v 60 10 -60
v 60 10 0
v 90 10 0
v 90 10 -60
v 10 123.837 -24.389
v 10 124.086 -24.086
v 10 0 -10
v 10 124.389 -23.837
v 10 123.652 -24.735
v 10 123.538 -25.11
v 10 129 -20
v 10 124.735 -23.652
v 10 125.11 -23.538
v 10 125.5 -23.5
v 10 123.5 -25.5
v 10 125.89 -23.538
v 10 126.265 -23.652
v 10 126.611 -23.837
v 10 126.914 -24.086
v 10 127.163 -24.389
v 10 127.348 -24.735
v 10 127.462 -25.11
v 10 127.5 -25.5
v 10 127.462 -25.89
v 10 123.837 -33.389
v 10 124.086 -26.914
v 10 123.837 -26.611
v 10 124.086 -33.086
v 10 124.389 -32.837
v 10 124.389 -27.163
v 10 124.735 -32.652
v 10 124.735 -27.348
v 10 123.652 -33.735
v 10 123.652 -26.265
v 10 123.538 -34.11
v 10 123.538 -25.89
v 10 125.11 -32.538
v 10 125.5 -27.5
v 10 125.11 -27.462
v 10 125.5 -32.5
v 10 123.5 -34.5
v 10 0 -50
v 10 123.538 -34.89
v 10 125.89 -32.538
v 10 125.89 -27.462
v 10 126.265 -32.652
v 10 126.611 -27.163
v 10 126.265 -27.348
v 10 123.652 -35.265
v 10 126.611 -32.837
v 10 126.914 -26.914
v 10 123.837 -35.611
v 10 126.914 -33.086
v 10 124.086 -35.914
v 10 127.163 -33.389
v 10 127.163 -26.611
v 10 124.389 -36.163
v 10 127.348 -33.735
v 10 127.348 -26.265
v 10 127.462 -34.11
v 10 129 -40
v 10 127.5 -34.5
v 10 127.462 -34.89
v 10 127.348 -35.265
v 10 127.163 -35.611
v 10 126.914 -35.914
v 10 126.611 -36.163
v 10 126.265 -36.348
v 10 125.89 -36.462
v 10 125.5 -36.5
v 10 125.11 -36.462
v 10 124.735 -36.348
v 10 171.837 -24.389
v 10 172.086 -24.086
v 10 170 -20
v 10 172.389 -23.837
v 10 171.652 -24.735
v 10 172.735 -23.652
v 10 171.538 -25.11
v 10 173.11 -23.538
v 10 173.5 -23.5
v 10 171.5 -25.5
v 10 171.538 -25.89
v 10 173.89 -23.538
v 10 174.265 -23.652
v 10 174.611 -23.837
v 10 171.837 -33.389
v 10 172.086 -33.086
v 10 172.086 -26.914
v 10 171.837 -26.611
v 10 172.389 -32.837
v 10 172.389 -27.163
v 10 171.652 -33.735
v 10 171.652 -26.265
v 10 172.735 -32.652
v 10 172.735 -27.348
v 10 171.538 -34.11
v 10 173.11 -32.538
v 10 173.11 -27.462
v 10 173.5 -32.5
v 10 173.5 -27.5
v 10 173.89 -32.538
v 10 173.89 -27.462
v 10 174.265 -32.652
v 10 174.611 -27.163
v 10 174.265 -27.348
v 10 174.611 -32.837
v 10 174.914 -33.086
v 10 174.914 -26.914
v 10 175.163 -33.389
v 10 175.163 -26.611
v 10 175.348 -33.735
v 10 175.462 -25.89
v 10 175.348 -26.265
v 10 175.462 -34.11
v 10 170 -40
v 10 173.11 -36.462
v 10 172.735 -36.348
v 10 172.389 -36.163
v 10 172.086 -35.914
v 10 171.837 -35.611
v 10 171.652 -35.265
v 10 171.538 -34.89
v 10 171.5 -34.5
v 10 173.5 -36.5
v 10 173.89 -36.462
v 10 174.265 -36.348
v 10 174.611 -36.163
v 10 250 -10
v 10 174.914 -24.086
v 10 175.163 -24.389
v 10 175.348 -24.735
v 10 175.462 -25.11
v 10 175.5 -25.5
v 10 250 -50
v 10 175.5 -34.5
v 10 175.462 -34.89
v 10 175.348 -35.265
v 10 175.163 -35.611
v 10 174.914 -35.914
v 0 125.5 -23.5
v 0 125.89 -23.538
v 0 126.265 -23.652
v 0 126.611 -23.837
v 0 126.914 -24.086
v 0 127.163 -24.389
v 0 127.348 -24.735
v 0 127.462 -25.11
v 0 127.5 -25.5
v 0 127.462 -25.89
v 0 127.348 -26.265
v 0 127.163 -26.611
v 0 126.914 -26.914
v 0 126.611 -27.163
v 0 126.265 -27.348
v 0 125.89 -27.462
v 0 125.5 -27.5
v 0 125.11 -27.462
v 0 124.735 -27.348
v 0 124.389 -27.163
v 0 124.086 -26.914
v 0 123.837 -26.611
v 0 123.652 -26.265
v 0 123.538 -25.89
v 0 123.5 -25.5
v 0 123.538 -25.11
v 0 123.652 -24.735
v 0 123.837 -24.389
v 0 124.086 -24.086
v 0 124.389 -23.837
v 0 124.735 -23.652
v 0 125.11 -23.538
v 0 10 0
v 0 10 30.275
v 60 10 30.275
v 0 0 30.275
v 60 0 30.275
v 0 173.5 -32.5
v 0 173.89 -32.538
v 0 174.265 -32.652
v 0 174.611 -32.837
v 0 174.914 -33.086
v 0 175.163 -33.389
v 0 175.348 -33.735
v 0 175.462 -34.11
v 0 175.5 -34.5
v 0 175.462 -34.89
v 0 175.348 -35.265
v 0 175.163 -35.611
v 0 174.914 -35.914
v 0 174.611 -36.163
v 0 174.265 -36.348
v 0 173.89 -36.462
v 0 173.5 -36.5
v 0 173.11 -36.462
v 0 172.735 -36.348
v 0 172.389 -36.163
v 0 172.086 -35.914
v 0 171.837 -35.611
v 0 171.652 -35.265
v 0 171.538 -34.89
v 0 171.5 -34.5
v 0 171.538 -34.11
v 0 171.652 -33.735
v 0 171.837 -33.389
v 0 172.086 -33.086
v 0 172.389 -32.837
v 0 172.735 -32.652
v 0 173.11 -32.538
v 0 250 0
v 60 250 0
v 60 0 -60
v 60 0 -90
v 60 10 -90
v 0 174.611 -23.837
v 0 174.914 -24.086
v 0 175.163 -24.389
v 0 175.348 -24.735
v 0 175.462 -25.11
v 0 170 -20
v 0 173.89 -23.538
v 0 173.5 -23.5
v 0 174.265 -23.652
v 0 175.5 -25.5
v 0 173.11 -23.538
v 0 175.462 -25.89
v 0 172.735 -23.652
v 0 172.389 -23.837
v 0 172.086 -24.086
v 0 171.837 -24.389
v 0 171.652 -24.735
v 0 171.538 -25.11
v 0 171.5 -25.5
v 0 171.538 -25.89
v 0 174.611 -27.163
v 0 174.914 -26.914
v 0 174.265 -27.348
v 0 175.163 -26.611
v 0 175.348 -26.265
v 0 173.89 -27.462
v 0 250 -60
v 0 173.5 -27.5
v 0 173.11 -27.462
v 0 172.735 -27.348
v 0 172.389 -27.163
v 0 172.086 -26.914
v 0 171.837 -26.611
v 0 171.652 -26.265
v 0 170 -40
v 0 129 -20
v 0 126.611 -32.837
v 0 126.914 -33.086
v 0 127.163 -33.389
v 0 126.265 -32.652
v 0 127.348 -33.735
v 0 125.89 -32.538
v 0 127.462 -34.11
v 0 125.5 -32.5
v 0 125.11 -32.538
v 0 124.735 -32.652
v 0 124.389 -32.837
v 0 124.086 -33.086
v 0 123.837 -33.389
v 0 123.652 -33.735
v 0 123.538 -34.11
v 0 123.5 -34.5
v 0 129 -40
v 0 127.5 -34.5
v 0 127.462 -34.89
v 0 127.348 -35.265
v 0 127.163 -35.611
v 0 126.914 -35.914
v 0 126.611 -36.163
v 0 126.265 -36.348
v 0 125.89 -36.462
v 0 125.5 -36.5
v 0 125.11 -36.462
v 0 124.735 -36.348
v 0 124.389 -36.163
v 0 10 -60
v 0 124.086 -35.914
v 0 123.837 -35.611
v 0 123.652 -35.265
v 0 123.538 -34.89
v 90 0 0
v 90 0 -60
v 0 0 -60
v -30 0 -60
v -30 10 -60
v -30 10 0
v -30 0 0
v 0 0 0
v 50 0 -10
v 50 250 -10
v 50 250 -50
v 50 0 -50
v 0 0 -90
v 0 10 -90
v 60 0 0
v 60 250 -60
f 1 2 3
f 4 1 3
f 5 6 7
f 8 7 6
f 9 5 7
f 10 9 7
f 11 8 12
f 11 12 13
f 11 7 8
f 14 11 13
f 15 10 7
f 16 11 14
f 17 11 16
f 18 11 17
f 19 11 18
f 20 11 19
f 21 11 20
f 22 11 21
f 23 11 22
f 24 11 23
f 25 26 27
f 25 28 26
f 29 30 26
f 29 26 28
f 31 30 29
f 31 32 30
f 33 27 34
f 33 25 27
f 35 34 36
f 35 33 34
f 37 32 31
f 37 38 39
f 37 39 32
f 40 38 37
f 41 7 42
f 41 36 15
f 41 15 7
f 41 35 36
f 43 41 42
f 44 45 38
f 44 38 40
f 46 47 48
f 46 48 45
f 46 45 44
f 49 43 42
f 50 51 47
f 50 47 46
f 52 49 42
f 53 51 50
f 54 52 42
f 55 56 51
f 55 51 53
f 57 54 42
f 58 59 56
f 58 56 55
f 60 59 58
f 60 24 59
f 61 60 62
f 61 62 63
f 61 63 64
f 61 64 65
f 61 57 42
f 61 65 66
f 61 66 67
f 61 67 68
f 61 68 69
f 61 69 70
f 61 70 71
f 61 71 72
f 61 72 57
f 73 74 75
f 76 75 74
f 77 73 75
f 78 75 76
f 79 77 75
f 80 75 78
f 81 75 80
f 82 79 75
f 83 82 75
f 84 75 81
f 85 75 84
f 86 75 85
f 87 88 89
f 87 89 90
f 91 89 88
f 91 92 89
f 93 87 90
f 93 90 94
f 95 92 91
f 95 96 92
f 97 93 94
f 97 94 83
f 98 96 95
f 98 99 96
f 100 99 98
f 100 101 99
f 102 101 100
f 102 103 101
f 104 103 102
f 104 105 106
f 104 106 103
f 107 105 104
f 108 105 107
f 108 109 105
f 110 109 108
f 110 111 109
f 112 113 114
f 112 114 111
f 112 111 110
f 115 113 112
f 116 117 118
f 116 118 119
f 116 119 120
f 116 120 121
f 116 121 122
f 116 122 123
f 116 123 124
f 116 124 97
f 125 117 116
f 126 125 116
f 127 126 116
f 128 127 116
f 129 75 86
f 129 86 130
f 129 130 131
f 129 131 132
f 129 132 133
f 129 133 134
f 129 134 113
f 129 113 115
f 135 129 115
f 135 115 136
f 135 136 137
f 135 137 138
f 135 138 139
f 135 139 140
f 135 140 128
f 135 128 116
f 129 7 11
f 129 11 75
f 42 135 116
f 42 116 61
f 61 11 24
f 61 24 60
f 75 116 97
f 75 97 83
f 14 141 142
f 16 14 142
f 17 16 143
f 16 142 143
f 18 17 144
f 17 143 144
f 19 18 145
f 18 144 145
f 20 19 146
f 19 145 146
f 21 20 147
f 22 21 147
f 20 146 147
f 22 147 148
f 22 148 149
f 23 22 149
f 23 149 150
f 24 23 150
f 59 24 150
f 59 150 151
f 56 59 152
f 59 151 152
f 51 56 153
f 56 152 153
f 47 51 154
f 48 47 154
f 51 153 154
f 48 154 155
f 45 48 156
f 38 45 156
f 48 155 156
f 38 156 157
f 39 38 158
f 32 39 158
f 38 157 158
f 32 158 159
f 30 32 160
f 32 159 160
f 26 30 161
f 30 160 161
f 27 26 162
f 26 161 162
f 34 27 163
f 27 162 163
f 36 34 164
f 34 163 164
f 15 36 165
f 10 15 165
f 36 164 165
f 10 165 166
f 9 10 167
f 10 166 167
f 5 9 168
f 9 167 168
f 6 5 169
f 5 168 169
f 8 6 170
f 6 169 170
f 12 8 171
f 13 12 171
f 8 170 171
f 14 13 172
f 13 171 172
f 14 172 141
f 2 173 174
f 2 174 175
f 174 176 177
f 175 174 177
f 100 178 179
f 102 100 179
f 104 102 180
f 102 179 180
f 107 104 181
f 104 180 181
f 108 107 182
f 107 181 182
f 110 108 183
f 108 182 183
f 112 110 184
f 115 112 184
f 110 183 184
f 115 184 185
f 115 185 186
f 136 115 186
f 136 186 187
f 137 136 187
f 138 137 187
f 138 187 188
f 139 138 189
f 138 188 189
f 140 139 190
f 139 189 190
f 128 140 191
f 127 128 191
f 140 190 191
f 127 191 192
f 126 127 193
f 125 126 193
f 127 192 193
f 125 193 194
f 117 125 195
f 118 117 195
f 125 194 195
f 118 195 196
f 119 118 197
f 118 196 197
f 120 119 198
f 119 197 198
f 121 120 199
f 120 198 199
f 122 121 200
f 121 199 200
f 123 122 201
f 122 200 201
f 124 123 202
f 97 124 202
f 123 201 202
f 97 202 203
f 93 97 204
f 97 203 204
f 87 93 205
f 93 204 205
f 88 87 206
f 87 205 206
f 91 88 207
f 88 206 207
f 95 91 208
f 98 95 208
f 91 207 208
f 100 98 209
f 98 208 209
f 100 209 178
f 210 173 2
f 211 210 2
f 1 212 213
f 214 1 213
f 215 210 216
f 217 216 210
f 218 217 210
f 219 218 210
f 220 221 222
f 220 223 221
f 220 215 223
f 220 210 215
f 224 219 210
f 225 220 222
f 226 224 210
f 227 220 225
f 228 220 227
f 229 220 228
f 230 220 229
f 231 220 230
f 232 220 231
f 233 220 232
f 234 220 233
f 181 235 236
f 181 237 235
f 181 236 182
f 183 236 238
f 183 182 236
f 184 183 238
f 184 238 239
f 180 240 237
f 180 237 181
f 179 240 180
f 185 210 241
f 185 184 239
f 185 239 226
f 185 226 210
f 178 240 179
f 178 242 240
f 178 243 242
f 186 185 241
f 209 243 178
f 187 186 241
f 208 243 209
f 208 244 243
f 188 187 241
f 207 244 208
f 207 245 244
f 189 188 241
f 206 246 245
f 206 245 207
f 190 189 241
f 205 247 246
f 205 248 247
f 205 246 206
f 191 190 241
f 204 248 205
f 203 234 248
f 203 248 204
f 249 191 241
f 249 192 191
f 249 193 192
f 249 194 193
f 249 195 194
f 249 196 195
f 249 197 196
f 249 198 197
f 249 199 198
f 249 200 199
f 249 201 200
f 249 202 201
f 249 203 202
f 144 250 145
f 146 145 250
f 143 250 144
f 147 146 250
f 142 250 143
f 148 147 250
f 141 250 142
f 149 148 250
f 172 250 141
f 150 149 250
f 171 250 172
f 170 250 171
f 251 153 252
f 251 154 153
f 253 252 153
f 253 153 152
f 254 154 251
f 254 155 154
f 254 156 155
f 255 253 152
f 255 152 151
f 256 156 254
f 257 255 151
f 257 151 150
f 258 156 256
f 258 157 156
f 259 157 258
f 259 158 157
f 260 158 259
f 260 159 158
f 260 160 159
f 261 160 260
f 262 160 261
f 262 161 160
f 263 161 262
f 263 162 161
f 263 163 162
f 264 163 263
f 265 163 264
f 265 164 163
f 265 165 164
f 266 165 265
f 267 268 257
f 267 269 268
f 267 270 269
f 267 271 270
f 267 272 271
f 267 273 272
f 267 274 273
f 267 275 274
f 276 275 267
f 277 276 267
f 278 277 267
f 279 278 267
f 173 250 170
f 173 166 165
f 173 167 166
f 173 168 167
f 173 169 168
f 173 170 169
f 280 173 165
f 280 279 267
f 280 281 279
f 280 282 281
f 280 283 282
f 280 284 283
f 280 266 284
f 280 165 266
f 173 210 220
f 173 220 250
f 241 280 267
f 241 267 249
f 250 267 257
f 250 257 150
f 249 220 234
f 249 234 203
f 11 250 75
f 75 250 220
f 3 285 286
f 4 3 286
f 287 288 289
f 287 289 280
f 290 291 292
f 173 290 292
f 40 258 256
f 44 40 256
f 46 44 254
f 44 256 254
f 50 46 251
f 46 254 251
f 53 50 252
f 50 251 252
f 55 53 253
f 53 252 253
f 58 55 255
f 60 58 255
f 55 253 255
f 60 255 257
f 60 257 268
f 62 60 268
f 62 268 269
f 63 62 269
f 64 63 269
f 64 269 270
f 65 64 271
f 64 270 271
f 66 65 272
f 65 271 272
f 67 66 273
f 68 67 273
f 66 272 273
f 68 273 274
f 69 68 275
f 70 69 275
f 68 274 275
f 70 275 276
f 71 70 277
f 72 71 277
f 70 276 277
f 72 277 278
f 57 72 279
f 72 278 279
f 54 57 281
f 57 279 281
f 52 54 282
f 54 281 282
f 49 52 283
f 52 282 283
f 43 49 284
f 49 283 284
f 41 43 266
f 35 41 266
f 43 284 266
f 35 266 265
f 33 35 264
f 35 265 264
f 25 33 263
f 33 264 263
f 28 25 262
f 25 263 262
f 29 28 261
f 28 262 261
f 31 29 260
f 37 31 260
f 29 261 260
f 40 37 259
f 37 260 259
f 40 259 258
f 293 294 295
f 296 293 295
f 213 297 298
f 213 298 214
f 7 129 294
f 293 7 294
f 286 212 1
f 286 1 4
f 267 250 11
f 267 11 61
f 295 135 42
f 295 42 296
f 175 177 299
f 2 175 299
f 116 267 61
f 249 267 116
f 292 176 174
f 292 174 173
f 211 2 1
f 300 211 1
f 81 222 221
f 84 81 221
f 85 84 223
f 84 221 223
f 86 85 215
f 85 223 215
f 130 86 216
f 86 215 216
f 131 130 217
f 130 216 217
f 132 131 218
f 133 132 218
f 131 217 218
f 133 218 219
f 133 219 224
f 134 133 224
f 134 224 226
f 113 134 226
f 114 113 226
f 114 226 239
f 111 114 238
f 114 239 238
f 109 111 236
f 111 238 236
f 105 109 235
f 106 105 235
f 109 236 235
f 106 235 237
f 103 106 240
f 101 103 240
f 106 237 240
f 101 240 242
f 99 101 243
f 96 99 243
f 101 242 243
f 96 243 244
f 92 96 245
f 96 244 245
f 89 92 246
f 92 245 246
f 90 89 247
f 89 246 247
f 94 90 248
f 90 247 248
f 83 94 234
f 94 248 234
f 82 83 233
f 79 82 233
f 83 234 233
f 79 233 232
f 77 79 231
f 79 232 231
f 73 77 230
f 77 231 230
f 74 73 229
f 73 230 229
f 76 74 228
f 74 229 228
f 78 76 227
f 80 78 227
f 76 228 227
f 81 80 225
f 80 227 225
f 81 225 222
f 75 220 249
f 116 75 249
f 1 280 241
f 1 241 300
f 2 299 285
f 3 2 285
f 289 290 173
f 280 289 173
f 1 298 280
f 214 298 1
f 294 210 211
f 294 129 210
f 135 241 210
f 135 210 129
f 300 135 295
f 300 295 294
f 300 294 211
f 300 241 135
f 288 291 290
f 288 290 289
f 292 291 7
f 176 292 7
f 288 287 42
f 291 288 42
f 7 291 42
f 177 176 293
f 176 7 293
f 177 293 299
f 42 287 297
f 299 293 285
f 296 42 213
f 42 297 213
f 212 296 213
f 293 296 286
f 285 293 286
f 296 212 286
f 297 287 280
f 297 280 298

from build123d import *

# Parameters (mm, degrees)
ESQUISSE1_W             = 60
ESQUISSE1_H             = 60
BOSS_EXTRU_1_DEPTH      = 250
ESQUISSE2_W             = 40
ESQUISSE2_H             = 40
ENL_V_MAT_EXTRU_1_DEPTH = 250
ESQUISSE3_W             = 20
ESQUISSE3_H             = 41
ENL_V_MAT_EXTRU_7_DEPTH = 10
ESQUISSE4_W             = 60
ESQUISSE4_H             = 30
ESQUISSE4_W_2           = 30
ESQUISSE4_H_2           = 60
ESQUISSE4_H_3           = 30.275028017
BOSS_EXTRU_2_DEPTH      = 10
ESQUISSE6_R             = 2
ENL_V_MAT_EXTRU_8_DEPTH = 10


with BuildPart() as part:
    # Esquisse1 → Boss.-Extru.1 (new body)
    with BuildSketch(Plane(origin=(0, 0, 0), x_dir=(1, 0, 0), z_dir=(0, 1, 0))):
        with Locations((30, 30)):
            Rectangle(ESQUISSE1_W, ESQUISSE1_H)
    extrude(amount=BOSS_EXTRU_1_DEPTH)

    # Esquisse2 → Enlèv. mat.-Extru.1 (cut)
    with BuildSketch(Plane(origin=(0, 250, 0), x_dir=(1, 0, 0), z_dir=(0, 1, 0))):
        with Locations((30, 30)):
            Rectangle(ESQUISSE2_W, ESQUISSE2_H)
    extrude(amount=-ENL_V_MAT_EXTRU_1_DEPTH, mode=Mode.SUBTRACT)

    # Esquisse3 → Enlèv. mat.-Extru.7 (cut)
    with BuildSketch(Plane(origin=(0, 0, 0), x_dir=(0, 0, -1), z_dir=(1, 0, 0))):
        with Locations((30, 149.5)):
            Rectangle(ESQUISSE3_W, ESQUISSE3_H)
    extrude(amount=ENL_V_MAT_EXTRU_7_DEPTH, mode=Mode.SUBTRACT)

    # Esquisse4 → Boss.-Extru.2 (add)
    with BuildSketch(Plane(origin=(0, 0, 0), x_dir=(1, 0, 0), z_dir=(0, 1, 0))):
        with Locations((30, 75)):
            Rectangle(ESQUISSE4_W, ESQUISSE4_H)
        with Locations((-15, 30)):
            Rectangle(ESQUISSE4_W_2, ESQUISSE4_H_2)
        with Locations((75, 30)):
            Rectangle(ESQUISSE4_W_2, ESQUISSE4_H_2)
        with Locations((30, -15.137514009)):
            Rectangle(ESQUISSE4_W, ESQUISSE4_H_3)
    extrude(amount=BOSS_EXTRU_2_DEPTH)

    # Esquisse6 → Enlèv. mat.-Extru.8 (cut)
    with BuildSketch(Plane.ZY):
        with Locations((-34.5, 173.5)):
            Circle(ESQUISSE6_R)
        with Locations((-25.5, 173.5)):
            Circle(ESQUISSE6_R)
        with Locations((-34.5, 125.5)):
            Circle(ESQUISSE6_R)
        with Locations((-25.5, 125.5)):
            Circle(ESQUISSE6_R)
    extrude(amount=-ENL_V_MAT_EXTRU_8_DEPTH, mode=Mode.SUBTRACT)


solid = part.part
